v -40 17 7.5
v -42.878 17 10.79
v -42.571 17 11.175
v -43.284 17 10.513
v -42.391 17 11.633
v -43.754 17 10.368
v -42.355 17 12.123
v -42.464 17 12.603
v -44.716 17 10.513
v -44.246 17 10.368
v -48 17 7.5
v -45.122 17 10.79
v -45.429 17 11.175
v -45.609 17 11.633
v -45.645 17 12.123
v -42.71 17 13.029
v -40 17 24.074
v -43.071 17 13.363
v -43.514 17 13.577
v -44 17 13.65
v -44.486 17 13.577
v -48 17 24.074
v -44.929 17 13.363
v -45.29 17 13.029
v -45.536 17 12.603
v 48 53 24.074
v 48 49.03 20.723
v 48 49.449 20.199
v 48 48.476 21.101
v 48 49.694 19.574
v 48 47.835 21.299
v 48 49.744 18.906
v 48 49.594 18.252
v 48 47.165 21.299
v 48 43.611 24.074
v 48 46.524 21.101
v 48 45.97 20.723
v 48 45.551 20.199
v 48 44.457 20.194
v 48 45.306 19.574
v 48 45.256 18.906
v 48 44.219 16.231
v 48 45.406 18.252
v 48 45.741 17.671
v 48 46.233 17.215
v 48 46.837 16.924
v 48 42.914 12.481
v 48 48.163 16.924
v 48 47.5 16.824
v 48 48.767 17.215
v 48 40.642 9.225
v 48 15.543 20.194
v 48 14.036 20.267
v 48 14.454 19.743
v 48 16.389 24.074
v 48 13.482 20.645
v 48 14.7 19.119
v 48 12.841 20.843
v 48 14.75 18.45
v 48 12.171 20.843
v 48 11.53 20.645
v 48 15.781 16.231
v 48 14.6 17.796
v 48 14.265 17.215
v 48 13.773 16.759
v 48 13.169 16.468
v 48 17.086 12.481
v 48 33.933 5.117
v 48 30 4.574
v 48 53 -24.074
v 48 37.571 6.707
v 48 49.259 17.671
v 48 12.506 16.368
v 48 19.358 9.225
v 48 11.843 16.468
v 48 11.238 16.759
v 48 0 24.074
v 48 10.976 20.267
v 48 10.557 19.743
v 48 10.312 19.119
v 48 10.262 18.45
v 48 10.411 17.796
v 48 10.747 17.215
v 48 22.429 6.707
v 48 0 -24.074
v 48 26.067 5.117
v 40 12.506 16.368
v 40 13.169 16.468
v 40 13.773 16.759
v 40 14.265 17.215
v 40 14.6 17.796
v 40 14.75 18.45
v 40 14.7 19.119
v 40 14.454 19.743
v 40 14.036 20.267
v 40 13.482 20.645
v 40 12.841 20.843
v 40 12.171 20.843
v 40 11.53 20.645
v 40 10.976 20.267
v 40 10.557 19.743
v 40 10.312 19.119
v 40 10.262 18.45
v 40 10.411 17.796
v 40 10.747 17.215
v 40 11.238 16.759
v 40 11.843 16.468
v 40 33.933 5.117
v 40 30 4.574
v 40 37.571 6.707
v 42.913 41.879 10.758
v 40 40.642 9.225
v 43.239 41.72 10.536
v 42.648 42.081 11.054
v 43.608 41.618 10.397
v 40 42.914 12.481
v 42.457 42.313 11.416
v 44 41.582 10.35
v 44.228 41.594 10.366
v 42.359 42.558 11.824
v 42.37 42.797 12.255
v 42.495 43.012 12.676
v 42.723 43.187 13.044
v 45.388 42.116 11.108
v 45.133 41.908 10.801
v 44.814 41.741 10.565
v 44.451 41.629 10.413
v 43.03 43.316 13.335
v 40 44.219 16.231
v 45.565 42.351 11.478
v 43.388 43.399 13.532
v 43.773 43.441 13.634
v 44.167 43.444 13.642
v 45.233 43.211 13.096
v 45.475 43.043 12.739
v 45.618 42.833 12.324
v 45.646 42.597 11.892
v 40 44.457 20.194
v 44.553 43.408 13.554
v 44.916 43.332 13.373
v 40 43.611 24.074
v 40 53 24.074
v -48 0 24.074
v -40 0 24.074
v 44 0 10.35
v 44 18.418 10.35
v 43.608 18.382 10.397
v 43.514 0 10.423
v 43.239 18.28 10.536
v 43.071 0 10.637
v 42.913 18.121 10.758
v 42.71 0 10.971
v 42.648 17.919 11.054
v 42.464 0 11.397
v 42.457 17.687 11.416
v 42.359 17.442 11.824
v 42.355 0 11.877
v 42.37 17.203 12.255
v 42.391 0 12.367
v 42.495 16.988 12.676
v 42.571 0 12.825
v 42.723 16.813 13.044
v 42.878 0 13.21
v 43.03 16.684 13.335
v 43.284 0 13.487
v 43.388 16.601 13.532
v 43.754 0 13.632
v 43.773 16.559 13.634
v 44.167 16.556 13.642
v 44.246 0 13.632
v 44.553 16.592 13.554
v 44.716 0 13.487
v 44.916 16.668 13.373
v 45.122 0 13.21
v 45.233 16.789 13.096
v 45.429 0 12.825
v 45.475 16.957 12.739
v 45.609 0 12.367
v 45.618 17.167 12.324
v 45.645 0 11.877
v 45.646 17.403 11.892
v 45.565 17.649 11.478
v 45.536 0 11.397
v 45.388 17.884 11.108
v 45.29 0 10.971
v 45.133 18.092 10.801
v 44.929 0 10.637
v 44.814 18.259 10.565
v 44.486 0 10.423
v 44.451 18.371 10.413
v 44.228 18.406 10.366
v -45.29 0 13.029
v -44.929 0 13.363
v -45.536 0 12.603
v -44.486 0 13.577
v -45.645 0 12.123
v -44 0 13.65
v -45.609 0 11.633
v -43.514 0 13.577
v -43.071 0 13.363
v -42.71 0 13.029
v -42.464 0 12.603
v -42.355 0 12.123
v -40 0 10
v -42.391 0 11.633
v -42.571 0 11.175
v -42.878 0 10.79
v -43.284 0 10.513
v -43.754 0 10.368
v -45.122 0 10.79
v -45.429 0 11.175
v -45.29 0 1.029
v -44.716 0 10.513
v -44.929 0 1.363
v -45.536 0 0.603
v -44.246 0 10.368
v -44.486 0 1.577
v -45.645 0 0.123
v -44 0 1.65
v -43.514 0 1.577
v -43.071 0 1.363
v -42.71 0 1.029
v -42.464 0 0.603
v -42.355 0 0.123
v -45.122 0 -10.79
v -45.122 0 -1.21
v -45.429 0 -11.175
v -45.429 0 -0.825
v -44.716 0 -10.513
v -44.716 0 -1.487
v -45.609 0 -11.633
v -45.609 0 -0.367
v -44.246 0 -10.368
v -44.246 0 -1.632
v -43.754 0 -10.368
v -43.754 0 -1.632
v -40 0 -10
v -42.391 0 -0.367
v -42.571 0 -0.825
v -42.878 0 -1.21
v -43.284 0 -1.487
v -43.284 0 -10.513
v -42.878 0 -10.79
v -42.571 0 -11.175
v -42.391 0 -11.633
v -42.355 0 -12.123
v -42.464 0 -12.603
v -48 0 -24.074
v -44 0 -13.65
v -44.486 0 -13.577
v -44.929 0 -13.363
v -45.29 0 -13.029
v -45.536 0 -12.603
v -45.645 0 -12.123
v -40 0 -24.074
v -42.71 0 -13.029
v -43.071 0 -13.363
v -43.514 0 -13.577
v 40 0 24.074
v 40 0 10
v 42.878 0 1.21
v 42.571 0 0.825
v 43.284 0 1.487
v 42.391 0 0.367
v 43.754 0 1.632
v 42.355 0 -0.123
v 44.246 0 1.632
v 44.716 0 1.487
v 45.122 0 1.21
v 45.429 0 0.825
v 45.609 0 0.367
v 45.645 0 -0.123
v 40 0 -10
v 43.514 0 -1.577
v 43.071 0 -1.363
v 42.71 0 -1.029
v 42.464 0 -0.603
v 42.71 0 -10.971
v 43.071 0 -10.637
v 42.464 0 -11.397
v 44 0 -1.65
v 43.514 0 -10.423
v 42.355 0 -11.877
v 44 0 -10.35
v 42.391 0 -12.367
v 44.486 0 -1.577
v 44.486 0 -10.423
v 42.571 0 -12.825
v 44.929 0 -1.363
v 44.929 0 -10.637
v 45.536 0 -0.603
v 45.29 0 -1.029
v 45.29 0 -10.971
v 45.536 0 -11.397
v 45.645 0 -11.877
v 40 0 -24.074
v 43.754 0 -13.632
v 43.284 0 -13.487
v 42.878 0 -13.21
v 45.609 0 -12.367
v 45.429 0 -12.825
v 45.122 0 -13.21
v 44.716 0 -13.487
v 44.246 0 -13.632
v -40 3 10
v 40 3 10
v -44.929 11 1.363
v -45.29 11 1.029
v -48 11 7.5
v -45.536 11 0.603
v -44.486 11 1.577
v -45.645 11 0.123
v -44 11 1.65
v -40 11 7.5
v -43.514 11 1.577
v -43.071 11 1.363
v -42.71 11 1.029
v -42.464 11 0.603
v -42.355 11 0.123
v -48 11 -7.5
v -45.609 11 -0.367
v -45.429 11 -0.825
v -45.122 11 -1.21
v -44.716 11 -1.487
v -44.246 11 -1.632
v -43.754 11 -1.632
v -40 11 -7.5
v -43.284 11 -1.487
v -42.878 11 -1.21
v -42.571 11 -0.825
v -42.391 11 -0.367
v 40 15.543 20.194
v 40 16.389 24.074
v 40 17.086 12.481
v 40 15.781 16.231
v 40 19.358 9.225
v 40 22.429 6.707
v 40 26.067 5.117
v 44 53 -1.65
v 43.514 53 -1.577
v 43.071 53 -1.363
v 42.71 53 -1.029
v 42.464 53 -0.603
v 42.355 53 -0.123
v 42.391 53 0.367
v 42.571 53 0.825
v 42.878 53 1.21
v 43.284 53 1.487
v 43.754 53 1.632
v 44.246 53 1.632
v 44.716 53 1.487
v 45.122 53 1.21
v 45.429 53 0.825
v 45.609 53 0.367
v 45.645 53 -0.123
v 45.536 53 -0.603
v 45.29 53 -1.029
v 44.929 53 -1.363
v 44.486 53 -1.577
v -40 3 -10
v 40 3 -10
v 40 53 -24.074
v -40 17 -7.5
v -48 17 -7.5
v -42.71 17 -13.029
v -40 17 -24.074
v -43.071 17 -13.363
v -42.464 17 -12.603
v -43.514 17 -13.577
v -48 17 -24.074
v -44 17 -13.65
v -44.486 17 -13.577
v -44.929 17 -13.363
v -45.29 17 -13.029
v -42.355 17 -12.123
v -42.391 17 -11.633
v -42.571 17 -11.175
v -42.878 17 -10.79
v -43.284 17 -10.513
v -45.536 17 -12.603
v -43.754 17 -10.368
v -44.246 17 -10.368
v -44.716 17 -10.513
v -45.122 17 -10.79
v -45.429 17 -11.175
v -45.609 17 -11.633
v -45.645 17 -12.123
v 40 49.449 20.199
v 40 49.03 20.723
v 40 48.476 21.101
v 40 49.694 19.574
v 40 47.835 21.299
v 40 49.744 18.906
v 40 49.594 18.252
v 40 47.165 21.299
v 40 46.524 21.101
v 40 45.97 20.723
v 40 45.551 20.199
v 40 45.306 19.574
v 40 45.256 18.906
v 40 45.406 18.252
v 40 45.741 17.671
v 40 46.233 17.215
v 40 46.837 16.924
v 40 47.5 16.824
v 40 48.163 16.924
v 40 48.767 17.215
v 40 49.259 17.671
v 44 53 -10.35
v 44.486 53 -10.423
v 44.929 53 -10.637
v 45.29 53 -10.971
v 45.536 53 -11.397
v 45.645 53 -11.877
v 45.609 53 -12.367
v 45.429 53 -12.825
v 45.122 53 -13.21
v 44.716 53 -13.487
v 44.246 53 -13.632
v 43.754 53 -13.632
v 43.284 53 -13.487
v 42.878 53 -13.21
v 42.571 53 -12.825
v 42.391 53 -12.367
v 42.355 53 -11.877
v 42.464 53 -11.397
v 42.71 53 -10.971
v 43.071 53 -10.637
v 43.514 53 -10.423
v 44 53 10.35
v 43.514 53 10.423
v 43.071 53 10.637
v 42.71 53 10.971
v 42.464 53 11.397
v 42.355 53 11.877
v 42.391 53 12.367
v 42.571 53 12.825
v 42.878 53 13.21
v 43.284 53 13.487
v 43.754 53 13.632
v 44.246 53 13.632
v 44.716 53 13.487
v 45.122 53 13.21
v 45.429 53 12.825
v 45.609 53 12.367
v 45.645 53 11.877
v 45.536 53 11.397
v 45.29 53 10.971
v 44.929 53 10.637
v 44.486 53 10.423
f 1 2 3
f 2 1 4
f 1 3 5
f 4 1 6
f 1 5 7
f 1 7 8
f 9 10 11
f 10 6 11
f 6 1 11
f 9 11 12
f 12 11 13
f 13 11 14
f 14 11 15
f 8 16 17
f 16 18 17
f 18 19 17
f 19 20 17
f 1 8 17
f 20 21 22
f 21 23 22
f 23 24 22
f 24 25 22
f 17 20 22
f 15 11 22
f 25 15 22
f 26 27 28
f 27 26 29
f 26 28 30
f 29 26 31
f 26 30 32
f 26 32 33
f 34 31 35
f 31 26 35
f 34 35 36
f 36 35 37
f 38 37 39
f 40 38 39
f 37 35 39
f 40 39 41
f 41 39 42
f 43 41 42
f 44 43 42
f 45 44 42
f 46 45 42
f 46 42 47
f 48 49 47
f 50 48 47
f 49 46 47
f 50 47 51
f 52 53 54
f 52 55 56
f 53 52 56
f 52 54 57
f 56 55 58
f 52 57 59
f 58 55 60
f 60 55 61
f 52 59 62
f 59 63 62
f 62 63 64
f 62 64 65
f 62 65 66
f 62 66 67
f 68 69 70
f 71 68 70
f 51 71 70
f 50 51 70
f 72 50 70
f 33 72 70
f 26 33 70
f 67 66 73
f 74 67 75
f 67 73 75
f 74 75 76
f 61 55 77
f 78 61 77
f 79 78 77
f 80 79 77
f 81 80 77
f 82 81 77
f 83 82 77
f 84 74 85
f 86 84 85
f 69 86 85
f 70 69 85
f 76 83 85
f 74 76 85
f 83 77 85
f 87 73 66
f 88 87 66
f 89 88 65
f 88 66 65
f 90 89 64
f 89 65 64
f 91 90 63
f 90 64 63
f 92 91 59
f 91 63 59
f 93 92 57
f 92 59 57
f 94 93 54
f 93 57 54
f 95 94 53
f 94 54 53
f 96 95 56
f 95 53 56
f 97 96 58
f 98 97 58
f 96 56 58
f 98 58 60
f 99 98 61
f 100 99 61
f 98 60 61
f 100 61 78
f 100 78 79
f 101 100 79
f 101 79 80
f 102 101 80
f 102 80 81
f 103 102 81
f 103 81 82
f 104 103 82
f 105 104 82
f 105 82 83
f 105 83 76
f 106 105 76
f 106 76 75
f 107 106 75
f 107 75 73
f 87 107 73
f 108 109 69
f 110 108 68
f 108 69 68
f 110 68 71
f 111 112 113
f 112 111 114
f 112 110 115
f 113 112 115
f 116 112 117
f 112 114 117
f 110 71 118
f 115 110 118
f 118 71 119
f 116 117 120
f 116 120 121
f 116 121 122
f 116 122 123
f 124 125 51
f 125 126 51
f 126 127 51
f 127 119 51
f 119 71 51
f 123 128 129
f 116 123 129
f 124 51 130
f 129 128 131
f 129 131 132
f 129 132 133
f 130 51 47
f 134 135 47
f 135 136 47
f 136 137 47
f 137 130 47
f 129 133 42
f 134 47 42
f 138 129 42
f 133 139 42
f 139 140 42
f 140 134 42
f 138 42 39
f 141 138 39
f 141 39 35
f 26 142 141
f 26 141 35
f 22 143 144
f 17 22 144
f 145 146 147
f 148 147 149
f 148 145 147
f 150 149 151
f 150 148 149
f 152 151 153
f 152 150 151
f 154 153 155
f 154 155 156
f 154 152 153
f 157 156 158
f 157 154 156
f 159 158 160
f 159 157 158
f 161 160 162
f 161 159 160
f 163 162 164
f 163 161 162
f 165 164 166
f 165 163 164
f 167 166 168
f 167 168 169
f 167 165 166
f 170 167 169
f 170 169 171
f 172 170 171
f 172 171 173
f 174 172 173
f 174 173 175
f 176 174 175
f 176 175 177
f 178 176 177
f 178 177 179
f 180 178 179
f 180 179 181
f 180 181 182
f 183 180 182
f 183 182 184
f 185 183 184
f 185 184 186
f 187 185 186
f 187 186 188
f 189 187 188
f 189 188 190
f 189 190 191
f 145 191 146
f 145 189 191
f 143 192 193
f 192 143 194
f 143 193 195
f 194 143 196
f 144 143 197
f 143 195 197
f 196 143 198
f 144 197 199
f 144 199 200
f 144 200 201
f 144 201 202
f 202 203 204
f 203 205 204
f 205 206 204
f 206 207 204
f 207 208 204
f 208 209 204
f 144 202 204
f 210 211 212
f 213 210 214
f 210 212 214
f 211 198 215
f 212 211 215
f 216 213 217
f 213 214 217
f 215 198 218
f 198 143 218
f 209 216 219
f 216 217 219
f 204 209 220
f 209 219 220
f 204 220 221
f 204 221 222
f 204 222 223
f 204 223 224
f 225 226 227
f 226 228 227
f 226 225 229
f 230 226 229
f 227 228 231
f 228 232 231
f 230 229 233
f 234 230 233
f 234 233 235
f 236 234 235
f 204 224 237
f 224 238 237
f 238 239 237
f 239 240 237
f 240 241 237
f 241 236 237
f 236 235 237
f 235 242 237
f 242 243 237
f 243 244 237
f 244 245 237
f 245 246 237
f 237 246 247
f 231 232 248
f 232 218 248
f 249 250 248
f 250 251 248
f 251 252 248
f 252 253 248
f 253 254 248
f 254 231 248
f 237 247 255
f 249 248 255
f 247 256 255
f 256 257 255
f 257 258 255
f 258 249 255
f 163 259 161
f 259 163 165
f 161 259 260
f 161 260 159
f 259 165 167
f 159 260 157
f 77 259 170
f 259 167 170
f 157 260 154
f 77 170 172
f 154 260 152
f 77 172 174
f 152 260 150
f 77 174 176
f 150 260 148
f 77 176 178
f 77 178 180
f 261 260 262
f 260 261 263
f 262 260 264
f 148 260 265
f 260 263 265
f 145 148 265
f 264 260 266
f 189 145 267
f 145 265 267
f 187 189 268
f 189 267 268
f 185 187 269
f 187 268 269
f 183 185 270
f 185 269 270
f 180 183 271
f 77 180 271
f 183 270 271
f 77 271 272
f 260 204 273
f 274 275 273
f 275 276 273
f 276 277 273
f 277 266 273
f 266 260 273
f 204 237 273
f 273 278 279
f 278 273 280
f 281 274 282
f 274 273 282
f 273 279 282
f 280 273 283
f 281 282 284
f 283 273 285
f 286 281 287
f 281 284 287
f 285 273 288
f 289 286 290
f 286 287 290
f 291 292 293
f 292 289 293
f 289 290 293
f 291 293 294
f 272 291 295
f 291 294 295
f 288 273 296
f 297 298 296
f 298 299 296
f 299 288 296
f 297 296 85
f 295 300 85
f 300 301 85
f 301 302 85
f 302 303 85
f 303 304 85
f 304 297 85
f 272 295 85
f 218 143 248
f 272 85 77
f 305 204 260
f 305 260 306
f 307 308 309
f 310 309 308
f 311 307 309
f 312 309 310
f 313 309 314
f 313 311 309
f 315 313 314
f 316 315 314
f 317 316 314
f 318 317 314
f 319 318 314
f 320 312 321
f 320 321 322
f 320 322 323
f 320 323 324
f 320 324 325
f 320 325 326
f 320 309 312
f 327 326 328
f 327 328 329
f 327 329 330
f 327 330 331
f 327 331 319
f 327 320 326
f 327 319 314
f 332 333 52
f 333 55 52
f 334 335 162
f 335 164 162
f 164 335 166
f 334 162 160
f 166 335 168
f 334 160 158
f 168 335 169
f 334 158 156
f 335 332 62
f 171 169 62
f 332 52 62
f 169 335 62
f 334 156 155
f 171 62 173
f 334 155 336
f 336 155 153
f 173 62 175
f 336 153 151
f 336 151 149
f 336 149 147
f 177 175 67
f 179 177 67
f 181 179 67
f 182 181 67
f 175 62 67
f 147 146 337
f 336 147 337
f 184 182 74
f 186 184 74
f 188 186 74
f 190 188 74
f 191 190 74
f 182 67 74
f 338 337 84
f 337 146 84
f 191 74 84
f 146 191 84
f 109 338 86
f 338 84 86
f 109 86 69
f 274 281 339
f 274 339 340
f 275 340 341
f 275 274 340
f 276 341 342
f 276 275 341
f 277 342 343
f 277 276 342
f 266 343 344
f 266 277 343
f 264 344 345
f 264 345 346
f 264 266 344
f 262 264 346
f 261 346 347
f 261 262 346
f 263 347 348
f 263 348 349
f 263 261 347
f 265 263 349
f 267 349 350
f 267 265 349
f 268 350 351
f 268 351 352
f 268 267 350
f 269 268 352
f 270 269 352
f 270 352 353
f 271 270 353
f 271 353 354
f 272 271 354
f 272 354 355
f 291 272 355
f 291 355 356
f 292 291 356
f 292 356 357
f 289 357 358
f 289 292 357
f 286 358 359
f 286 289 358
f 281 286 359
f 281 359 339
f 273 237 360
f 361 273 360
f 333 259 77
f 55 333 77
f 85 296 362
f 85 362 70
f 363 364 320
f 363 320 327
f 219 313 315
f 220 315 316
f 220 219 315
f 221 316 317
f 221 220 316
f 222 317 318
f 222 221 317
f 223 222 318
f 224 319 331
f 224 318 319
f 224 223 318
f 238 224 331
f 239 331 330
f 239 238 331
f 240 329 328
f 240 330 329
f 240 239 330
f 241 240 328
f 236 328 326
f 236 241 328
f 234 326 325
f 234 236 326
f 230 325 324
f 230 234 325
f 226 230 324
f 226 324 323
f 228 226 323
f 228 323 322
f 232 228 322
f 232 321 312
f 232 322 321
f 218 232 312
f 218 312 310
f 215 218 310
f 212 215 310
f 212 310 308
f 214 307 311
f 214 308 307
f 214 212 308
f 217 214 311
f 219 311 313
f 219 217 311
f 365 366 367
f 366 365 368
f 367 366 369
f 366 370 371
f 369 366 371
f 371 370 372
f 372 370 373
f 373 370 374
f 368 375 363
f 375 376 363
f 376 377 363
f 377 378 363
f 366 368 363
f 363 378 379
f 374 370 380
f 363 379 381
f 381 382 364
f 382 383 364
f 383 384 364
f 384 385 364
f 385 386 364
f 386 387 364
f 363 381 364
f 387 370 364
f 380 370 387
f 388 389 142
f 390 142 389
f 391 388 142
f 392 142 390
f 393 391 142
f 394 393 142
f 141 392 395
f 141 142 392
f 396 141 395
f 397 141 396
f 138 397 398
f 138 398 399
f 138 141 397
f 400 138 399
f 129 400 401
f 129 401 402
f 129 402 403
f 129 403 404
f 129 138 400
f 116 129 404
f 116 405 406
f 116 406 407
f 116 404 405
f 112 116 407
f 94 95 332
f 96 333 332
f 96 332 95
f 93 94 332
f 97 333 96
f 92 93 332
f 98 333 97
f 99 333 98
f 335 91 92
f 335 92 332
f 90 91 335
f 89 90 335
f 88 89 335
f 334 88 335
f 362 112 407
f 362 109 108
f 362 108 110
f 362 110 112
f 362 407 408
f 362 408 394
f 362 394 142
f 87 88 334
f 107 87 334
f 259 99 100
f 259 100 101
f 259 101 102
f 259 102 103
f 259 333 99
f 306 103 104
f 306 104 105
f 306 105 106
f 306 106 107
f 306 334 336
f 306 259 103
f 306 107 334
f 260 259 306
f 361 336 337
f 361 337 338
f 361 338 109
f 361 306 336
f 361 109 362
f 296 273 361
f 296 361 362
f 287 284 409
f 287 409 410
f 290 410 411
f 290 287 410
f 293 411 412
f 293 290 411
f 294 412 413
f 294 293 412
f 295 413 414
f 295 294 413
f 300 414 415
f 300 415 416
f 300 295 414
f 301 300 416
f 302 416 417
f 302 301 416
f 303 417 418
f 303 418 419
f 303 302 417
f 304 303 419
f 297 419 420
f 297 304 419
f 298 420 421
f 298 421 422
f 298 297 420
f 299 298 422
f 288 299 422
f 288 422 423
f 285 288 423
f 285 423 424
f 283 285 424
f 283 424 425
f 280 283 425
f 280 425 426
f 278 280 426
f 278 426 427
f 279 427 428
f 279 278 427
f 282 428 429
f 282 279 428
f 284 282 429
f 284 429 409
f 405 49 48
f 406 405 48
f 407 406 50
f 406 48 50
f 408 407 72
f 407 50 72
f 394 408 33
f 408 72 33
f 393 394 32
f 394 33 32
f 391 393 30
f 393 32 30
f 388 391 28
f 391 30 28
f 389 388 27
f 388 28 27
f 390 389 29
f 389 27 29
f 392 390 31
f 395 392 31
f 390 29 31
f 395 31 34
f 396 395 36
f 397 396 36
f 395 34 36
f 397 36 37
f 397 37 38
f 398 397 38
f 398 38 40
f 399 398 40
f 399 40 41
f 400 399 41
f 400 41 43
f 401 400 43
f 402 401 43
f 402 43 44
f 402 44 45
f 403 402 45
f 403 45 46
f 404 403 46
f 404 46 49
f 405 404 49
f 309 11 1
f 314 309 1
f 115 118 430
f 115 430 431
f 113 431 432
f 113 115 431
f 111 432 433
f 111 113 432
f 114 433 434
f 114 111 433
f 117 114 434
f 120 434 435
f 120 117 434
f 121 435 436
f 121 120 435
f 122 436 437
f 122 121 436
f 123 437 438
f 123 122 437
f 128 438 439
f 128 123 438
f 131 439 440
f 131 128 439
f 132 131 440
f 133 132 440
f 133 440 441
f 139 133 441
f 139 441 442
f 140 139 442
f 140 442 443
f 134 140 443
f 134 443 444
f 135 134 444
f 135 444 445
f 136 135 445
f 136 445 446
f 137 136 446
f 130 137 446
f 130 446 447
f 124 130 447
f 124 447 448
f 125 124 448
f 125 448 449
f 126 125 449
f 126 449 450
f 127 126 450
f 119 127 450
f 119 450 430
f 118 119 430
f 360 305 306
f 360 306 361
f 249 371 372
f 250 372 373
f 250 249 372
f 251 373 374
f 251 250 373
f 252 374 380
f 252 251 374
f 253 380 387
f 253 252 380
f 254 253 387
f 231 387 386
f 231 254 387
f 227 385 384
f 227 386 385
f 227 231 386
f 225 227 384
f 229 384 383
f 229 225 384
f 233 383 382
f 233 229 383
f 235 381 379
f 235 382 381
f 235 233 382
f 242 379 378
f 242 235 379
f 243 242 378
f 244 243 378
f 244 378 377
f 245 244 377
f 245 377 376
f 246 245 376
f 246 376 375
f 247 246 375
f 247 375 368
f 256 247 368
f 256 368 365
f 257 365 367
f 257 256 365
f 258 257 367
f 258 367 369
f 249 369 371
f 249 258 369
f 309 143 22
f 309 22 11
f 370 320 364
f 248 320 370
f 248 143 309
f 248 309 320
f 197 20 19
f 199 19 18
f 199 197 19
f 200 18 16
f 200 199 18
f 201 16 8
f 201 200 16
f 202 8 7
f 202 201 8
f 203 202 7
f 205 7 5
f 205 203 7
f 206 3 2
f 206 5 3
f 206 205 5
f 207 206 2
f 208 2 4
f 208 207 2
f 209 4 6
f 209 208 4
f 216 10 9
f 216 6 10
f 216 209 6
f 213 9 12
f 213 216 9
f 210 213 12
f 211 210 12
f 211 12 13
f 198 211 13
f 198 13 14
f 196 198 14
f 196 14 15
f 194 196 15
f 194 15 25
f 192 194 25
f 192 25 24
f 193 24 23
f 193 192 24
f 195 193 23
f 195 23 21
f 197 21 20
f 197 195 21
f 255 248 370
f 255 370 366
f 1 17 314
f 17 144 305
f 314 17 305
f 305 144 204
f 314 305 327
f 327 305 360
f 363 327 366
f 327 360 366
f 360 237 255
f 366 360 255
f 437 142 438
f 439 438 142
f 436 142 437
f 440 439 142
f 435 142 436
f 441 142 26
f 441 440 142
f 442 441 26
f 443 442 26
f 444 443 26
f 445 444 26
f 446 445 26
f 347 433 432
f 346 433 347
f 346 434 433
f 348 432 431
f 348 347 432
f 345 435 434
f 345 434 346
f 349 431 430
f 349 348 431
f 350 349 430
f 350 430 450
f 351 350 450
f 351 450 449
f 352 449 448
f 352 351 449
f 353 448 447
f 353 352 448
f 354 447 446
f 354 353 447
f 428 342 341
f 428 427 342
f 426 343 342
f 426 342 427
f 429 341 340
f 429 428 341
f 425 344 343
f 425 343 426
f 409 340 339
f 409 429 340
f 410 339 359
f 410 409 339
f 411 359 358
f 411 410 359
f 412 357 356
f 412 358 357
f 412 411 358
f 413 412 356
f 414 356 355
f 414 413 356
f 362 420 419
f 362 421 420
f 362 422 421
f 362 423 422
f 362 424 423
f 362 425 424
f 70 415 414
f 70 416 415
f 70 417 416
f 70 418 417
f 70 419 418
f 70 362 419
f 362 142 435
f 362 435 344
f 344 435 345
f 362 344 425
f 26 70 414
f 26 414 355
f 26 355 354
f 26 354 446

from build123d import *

# Parameters (mm, degrees)
SKETCH_1_W          = 8
SKETCH_1_H          = 48.14748393
SKETCH_1_R          = 1.65
EXTRUDE_1_DEPTH     = 53
EXTRUDE_1_2_DEPTH   = 53
SKETCH_2_W          = 20
SKETCH_2_H          = 3
EXTRUDE_2_DEPTH     = 80
SKETCH_3_R          = 14.5
SKETCH_3_R_2        = 2.25
CUT_EXTRUDE_1_DEPTH = 20
SKETCH_4_W          = 48.14748393
SKETCH_4_H          = 36
CUT_EXTRUDE_2_DEPTH = 15
SKETCH_6_W          = 8
SKETCH_6_H          = 15
CUT_EXTRUDE_4_DEPTH = 6


with BuildPart() as part:
    # 草图1 → 凸台-拉伸1 (new body)
    with BuildSketch(Plane(origin=(0, 0, 0), x_dir=(1, 0, 0), z_dir=(0, 1, 0))):
        with Locations((44, 0)):
            Rectangle(SKETCH_1_W, SKETCH_1_H)
        with Locations(Location((44, 0, 0), (0, 0, 90))):
            Circle(SKETCH_1_R, mode=Mode.SUBTRACT)
        with Locations(Location((44, -12, 0), (0, 0, 90))):
            Circle(SKETCH_1_R, mode=Mode.SUBTRACT)
        with Locations(Location((44, 12, 0), (0, 0, 270))):
            Circle(SKETCH_1_R, mode=Mode.SUBTRACT)
    extrude(amount=EXTRUDE_1_DEPTH)



with BuildPart() as body_2:
    # 草图1 → Extrude 1 2 (new body)
    with BuildSketch(Plane(origin=(0, 0, 0), x_dir=(1, 0, 0), z_dir=(0, 1, 0))):
        with Locations((-44, 0)):
            Rectangle(SKETCH_1_W, SKETCH_1_H)
        with Locations(Location((-44, 0, 0), (0, 0, 270))):
            Circle(SKETCH_1_R, mode=Mode.SUBTRACT)
        with Locations(Location((-44, -12, 0), (0, 0, 270))):
            Circle(SKETCH_1_R, mode=Mode.SUBTRACT)
        with Locations(Location((-44, 12, 0), (0, 0, 90))):
            Circle(SKETCH_1_R, mode=Mode.SUBTRACT)
    extrude(amount=EXTRUDE_1_2_DEPTH)


with BuildPart() as part_1:
    add(part.part)

    add(body_2.part)  # 凸台-拉伸2 merges body 2
    # 草图2 → 凸台-拉伸2 (add)
    with BuildSketch(Plane(origin=(-40, 0, 0), x_dir=(0, 0, -1), z_dir=(1, 0, 0))):
        with Locations((0, 1.5)):
            Rectangle(SKETCH_2_W, SKETCH_2_H)
    extrude(amount=EXTRUDE_2_DEPTH)

    # 草图3 → 切除-拉伸1 (cut)
    with BuildSketch(Plane(origin=(48, 0, 0), x_dir=(0, 0, -1), z_dir=(1, 0, 0))):
        with Locations((-19.073741965, 30)):
            Circle(SKETCH_3_R)
        with Locations((-19.073741965, 47.5)):
            Circle(SKETCH_3_R_2)
        with Locations((-18.617981623, 12.505935792)):
            Circle(SKETCH_3_R_2)
    extrude(amount=-CUT_EXTRUDE_1_DEPTH, mode=Mode.SUBTRACT)

    # 草图4 → 切除-拉伸2 (cut)
    with BuildSketch(Plane.ZY.offset(48)):
        with Locations((0, 35)):
            Rectangle(SKETCH_4_W, SKETCH_4_H)
    extrude(amount=-CUT_EXTRUDE_2_DEPTH, mode=Mode.SUBTRACT)

    # 草图6 → 切除-拉伸4 (cut)
    with BuildSketch(Plane(origin=(0, 17, 0), x_dir=(1, 0, 0), z_dir=(0, 1, 0))):
        with Locations((-44, 0)):
            Rectangle(SKETCH_6_W, SKETCH_6_H)
    extrude(amount=-CUT_EXTRUDE_4_DEPTH, mode=Mode.SUBTRACT)


solid = part_1.part
